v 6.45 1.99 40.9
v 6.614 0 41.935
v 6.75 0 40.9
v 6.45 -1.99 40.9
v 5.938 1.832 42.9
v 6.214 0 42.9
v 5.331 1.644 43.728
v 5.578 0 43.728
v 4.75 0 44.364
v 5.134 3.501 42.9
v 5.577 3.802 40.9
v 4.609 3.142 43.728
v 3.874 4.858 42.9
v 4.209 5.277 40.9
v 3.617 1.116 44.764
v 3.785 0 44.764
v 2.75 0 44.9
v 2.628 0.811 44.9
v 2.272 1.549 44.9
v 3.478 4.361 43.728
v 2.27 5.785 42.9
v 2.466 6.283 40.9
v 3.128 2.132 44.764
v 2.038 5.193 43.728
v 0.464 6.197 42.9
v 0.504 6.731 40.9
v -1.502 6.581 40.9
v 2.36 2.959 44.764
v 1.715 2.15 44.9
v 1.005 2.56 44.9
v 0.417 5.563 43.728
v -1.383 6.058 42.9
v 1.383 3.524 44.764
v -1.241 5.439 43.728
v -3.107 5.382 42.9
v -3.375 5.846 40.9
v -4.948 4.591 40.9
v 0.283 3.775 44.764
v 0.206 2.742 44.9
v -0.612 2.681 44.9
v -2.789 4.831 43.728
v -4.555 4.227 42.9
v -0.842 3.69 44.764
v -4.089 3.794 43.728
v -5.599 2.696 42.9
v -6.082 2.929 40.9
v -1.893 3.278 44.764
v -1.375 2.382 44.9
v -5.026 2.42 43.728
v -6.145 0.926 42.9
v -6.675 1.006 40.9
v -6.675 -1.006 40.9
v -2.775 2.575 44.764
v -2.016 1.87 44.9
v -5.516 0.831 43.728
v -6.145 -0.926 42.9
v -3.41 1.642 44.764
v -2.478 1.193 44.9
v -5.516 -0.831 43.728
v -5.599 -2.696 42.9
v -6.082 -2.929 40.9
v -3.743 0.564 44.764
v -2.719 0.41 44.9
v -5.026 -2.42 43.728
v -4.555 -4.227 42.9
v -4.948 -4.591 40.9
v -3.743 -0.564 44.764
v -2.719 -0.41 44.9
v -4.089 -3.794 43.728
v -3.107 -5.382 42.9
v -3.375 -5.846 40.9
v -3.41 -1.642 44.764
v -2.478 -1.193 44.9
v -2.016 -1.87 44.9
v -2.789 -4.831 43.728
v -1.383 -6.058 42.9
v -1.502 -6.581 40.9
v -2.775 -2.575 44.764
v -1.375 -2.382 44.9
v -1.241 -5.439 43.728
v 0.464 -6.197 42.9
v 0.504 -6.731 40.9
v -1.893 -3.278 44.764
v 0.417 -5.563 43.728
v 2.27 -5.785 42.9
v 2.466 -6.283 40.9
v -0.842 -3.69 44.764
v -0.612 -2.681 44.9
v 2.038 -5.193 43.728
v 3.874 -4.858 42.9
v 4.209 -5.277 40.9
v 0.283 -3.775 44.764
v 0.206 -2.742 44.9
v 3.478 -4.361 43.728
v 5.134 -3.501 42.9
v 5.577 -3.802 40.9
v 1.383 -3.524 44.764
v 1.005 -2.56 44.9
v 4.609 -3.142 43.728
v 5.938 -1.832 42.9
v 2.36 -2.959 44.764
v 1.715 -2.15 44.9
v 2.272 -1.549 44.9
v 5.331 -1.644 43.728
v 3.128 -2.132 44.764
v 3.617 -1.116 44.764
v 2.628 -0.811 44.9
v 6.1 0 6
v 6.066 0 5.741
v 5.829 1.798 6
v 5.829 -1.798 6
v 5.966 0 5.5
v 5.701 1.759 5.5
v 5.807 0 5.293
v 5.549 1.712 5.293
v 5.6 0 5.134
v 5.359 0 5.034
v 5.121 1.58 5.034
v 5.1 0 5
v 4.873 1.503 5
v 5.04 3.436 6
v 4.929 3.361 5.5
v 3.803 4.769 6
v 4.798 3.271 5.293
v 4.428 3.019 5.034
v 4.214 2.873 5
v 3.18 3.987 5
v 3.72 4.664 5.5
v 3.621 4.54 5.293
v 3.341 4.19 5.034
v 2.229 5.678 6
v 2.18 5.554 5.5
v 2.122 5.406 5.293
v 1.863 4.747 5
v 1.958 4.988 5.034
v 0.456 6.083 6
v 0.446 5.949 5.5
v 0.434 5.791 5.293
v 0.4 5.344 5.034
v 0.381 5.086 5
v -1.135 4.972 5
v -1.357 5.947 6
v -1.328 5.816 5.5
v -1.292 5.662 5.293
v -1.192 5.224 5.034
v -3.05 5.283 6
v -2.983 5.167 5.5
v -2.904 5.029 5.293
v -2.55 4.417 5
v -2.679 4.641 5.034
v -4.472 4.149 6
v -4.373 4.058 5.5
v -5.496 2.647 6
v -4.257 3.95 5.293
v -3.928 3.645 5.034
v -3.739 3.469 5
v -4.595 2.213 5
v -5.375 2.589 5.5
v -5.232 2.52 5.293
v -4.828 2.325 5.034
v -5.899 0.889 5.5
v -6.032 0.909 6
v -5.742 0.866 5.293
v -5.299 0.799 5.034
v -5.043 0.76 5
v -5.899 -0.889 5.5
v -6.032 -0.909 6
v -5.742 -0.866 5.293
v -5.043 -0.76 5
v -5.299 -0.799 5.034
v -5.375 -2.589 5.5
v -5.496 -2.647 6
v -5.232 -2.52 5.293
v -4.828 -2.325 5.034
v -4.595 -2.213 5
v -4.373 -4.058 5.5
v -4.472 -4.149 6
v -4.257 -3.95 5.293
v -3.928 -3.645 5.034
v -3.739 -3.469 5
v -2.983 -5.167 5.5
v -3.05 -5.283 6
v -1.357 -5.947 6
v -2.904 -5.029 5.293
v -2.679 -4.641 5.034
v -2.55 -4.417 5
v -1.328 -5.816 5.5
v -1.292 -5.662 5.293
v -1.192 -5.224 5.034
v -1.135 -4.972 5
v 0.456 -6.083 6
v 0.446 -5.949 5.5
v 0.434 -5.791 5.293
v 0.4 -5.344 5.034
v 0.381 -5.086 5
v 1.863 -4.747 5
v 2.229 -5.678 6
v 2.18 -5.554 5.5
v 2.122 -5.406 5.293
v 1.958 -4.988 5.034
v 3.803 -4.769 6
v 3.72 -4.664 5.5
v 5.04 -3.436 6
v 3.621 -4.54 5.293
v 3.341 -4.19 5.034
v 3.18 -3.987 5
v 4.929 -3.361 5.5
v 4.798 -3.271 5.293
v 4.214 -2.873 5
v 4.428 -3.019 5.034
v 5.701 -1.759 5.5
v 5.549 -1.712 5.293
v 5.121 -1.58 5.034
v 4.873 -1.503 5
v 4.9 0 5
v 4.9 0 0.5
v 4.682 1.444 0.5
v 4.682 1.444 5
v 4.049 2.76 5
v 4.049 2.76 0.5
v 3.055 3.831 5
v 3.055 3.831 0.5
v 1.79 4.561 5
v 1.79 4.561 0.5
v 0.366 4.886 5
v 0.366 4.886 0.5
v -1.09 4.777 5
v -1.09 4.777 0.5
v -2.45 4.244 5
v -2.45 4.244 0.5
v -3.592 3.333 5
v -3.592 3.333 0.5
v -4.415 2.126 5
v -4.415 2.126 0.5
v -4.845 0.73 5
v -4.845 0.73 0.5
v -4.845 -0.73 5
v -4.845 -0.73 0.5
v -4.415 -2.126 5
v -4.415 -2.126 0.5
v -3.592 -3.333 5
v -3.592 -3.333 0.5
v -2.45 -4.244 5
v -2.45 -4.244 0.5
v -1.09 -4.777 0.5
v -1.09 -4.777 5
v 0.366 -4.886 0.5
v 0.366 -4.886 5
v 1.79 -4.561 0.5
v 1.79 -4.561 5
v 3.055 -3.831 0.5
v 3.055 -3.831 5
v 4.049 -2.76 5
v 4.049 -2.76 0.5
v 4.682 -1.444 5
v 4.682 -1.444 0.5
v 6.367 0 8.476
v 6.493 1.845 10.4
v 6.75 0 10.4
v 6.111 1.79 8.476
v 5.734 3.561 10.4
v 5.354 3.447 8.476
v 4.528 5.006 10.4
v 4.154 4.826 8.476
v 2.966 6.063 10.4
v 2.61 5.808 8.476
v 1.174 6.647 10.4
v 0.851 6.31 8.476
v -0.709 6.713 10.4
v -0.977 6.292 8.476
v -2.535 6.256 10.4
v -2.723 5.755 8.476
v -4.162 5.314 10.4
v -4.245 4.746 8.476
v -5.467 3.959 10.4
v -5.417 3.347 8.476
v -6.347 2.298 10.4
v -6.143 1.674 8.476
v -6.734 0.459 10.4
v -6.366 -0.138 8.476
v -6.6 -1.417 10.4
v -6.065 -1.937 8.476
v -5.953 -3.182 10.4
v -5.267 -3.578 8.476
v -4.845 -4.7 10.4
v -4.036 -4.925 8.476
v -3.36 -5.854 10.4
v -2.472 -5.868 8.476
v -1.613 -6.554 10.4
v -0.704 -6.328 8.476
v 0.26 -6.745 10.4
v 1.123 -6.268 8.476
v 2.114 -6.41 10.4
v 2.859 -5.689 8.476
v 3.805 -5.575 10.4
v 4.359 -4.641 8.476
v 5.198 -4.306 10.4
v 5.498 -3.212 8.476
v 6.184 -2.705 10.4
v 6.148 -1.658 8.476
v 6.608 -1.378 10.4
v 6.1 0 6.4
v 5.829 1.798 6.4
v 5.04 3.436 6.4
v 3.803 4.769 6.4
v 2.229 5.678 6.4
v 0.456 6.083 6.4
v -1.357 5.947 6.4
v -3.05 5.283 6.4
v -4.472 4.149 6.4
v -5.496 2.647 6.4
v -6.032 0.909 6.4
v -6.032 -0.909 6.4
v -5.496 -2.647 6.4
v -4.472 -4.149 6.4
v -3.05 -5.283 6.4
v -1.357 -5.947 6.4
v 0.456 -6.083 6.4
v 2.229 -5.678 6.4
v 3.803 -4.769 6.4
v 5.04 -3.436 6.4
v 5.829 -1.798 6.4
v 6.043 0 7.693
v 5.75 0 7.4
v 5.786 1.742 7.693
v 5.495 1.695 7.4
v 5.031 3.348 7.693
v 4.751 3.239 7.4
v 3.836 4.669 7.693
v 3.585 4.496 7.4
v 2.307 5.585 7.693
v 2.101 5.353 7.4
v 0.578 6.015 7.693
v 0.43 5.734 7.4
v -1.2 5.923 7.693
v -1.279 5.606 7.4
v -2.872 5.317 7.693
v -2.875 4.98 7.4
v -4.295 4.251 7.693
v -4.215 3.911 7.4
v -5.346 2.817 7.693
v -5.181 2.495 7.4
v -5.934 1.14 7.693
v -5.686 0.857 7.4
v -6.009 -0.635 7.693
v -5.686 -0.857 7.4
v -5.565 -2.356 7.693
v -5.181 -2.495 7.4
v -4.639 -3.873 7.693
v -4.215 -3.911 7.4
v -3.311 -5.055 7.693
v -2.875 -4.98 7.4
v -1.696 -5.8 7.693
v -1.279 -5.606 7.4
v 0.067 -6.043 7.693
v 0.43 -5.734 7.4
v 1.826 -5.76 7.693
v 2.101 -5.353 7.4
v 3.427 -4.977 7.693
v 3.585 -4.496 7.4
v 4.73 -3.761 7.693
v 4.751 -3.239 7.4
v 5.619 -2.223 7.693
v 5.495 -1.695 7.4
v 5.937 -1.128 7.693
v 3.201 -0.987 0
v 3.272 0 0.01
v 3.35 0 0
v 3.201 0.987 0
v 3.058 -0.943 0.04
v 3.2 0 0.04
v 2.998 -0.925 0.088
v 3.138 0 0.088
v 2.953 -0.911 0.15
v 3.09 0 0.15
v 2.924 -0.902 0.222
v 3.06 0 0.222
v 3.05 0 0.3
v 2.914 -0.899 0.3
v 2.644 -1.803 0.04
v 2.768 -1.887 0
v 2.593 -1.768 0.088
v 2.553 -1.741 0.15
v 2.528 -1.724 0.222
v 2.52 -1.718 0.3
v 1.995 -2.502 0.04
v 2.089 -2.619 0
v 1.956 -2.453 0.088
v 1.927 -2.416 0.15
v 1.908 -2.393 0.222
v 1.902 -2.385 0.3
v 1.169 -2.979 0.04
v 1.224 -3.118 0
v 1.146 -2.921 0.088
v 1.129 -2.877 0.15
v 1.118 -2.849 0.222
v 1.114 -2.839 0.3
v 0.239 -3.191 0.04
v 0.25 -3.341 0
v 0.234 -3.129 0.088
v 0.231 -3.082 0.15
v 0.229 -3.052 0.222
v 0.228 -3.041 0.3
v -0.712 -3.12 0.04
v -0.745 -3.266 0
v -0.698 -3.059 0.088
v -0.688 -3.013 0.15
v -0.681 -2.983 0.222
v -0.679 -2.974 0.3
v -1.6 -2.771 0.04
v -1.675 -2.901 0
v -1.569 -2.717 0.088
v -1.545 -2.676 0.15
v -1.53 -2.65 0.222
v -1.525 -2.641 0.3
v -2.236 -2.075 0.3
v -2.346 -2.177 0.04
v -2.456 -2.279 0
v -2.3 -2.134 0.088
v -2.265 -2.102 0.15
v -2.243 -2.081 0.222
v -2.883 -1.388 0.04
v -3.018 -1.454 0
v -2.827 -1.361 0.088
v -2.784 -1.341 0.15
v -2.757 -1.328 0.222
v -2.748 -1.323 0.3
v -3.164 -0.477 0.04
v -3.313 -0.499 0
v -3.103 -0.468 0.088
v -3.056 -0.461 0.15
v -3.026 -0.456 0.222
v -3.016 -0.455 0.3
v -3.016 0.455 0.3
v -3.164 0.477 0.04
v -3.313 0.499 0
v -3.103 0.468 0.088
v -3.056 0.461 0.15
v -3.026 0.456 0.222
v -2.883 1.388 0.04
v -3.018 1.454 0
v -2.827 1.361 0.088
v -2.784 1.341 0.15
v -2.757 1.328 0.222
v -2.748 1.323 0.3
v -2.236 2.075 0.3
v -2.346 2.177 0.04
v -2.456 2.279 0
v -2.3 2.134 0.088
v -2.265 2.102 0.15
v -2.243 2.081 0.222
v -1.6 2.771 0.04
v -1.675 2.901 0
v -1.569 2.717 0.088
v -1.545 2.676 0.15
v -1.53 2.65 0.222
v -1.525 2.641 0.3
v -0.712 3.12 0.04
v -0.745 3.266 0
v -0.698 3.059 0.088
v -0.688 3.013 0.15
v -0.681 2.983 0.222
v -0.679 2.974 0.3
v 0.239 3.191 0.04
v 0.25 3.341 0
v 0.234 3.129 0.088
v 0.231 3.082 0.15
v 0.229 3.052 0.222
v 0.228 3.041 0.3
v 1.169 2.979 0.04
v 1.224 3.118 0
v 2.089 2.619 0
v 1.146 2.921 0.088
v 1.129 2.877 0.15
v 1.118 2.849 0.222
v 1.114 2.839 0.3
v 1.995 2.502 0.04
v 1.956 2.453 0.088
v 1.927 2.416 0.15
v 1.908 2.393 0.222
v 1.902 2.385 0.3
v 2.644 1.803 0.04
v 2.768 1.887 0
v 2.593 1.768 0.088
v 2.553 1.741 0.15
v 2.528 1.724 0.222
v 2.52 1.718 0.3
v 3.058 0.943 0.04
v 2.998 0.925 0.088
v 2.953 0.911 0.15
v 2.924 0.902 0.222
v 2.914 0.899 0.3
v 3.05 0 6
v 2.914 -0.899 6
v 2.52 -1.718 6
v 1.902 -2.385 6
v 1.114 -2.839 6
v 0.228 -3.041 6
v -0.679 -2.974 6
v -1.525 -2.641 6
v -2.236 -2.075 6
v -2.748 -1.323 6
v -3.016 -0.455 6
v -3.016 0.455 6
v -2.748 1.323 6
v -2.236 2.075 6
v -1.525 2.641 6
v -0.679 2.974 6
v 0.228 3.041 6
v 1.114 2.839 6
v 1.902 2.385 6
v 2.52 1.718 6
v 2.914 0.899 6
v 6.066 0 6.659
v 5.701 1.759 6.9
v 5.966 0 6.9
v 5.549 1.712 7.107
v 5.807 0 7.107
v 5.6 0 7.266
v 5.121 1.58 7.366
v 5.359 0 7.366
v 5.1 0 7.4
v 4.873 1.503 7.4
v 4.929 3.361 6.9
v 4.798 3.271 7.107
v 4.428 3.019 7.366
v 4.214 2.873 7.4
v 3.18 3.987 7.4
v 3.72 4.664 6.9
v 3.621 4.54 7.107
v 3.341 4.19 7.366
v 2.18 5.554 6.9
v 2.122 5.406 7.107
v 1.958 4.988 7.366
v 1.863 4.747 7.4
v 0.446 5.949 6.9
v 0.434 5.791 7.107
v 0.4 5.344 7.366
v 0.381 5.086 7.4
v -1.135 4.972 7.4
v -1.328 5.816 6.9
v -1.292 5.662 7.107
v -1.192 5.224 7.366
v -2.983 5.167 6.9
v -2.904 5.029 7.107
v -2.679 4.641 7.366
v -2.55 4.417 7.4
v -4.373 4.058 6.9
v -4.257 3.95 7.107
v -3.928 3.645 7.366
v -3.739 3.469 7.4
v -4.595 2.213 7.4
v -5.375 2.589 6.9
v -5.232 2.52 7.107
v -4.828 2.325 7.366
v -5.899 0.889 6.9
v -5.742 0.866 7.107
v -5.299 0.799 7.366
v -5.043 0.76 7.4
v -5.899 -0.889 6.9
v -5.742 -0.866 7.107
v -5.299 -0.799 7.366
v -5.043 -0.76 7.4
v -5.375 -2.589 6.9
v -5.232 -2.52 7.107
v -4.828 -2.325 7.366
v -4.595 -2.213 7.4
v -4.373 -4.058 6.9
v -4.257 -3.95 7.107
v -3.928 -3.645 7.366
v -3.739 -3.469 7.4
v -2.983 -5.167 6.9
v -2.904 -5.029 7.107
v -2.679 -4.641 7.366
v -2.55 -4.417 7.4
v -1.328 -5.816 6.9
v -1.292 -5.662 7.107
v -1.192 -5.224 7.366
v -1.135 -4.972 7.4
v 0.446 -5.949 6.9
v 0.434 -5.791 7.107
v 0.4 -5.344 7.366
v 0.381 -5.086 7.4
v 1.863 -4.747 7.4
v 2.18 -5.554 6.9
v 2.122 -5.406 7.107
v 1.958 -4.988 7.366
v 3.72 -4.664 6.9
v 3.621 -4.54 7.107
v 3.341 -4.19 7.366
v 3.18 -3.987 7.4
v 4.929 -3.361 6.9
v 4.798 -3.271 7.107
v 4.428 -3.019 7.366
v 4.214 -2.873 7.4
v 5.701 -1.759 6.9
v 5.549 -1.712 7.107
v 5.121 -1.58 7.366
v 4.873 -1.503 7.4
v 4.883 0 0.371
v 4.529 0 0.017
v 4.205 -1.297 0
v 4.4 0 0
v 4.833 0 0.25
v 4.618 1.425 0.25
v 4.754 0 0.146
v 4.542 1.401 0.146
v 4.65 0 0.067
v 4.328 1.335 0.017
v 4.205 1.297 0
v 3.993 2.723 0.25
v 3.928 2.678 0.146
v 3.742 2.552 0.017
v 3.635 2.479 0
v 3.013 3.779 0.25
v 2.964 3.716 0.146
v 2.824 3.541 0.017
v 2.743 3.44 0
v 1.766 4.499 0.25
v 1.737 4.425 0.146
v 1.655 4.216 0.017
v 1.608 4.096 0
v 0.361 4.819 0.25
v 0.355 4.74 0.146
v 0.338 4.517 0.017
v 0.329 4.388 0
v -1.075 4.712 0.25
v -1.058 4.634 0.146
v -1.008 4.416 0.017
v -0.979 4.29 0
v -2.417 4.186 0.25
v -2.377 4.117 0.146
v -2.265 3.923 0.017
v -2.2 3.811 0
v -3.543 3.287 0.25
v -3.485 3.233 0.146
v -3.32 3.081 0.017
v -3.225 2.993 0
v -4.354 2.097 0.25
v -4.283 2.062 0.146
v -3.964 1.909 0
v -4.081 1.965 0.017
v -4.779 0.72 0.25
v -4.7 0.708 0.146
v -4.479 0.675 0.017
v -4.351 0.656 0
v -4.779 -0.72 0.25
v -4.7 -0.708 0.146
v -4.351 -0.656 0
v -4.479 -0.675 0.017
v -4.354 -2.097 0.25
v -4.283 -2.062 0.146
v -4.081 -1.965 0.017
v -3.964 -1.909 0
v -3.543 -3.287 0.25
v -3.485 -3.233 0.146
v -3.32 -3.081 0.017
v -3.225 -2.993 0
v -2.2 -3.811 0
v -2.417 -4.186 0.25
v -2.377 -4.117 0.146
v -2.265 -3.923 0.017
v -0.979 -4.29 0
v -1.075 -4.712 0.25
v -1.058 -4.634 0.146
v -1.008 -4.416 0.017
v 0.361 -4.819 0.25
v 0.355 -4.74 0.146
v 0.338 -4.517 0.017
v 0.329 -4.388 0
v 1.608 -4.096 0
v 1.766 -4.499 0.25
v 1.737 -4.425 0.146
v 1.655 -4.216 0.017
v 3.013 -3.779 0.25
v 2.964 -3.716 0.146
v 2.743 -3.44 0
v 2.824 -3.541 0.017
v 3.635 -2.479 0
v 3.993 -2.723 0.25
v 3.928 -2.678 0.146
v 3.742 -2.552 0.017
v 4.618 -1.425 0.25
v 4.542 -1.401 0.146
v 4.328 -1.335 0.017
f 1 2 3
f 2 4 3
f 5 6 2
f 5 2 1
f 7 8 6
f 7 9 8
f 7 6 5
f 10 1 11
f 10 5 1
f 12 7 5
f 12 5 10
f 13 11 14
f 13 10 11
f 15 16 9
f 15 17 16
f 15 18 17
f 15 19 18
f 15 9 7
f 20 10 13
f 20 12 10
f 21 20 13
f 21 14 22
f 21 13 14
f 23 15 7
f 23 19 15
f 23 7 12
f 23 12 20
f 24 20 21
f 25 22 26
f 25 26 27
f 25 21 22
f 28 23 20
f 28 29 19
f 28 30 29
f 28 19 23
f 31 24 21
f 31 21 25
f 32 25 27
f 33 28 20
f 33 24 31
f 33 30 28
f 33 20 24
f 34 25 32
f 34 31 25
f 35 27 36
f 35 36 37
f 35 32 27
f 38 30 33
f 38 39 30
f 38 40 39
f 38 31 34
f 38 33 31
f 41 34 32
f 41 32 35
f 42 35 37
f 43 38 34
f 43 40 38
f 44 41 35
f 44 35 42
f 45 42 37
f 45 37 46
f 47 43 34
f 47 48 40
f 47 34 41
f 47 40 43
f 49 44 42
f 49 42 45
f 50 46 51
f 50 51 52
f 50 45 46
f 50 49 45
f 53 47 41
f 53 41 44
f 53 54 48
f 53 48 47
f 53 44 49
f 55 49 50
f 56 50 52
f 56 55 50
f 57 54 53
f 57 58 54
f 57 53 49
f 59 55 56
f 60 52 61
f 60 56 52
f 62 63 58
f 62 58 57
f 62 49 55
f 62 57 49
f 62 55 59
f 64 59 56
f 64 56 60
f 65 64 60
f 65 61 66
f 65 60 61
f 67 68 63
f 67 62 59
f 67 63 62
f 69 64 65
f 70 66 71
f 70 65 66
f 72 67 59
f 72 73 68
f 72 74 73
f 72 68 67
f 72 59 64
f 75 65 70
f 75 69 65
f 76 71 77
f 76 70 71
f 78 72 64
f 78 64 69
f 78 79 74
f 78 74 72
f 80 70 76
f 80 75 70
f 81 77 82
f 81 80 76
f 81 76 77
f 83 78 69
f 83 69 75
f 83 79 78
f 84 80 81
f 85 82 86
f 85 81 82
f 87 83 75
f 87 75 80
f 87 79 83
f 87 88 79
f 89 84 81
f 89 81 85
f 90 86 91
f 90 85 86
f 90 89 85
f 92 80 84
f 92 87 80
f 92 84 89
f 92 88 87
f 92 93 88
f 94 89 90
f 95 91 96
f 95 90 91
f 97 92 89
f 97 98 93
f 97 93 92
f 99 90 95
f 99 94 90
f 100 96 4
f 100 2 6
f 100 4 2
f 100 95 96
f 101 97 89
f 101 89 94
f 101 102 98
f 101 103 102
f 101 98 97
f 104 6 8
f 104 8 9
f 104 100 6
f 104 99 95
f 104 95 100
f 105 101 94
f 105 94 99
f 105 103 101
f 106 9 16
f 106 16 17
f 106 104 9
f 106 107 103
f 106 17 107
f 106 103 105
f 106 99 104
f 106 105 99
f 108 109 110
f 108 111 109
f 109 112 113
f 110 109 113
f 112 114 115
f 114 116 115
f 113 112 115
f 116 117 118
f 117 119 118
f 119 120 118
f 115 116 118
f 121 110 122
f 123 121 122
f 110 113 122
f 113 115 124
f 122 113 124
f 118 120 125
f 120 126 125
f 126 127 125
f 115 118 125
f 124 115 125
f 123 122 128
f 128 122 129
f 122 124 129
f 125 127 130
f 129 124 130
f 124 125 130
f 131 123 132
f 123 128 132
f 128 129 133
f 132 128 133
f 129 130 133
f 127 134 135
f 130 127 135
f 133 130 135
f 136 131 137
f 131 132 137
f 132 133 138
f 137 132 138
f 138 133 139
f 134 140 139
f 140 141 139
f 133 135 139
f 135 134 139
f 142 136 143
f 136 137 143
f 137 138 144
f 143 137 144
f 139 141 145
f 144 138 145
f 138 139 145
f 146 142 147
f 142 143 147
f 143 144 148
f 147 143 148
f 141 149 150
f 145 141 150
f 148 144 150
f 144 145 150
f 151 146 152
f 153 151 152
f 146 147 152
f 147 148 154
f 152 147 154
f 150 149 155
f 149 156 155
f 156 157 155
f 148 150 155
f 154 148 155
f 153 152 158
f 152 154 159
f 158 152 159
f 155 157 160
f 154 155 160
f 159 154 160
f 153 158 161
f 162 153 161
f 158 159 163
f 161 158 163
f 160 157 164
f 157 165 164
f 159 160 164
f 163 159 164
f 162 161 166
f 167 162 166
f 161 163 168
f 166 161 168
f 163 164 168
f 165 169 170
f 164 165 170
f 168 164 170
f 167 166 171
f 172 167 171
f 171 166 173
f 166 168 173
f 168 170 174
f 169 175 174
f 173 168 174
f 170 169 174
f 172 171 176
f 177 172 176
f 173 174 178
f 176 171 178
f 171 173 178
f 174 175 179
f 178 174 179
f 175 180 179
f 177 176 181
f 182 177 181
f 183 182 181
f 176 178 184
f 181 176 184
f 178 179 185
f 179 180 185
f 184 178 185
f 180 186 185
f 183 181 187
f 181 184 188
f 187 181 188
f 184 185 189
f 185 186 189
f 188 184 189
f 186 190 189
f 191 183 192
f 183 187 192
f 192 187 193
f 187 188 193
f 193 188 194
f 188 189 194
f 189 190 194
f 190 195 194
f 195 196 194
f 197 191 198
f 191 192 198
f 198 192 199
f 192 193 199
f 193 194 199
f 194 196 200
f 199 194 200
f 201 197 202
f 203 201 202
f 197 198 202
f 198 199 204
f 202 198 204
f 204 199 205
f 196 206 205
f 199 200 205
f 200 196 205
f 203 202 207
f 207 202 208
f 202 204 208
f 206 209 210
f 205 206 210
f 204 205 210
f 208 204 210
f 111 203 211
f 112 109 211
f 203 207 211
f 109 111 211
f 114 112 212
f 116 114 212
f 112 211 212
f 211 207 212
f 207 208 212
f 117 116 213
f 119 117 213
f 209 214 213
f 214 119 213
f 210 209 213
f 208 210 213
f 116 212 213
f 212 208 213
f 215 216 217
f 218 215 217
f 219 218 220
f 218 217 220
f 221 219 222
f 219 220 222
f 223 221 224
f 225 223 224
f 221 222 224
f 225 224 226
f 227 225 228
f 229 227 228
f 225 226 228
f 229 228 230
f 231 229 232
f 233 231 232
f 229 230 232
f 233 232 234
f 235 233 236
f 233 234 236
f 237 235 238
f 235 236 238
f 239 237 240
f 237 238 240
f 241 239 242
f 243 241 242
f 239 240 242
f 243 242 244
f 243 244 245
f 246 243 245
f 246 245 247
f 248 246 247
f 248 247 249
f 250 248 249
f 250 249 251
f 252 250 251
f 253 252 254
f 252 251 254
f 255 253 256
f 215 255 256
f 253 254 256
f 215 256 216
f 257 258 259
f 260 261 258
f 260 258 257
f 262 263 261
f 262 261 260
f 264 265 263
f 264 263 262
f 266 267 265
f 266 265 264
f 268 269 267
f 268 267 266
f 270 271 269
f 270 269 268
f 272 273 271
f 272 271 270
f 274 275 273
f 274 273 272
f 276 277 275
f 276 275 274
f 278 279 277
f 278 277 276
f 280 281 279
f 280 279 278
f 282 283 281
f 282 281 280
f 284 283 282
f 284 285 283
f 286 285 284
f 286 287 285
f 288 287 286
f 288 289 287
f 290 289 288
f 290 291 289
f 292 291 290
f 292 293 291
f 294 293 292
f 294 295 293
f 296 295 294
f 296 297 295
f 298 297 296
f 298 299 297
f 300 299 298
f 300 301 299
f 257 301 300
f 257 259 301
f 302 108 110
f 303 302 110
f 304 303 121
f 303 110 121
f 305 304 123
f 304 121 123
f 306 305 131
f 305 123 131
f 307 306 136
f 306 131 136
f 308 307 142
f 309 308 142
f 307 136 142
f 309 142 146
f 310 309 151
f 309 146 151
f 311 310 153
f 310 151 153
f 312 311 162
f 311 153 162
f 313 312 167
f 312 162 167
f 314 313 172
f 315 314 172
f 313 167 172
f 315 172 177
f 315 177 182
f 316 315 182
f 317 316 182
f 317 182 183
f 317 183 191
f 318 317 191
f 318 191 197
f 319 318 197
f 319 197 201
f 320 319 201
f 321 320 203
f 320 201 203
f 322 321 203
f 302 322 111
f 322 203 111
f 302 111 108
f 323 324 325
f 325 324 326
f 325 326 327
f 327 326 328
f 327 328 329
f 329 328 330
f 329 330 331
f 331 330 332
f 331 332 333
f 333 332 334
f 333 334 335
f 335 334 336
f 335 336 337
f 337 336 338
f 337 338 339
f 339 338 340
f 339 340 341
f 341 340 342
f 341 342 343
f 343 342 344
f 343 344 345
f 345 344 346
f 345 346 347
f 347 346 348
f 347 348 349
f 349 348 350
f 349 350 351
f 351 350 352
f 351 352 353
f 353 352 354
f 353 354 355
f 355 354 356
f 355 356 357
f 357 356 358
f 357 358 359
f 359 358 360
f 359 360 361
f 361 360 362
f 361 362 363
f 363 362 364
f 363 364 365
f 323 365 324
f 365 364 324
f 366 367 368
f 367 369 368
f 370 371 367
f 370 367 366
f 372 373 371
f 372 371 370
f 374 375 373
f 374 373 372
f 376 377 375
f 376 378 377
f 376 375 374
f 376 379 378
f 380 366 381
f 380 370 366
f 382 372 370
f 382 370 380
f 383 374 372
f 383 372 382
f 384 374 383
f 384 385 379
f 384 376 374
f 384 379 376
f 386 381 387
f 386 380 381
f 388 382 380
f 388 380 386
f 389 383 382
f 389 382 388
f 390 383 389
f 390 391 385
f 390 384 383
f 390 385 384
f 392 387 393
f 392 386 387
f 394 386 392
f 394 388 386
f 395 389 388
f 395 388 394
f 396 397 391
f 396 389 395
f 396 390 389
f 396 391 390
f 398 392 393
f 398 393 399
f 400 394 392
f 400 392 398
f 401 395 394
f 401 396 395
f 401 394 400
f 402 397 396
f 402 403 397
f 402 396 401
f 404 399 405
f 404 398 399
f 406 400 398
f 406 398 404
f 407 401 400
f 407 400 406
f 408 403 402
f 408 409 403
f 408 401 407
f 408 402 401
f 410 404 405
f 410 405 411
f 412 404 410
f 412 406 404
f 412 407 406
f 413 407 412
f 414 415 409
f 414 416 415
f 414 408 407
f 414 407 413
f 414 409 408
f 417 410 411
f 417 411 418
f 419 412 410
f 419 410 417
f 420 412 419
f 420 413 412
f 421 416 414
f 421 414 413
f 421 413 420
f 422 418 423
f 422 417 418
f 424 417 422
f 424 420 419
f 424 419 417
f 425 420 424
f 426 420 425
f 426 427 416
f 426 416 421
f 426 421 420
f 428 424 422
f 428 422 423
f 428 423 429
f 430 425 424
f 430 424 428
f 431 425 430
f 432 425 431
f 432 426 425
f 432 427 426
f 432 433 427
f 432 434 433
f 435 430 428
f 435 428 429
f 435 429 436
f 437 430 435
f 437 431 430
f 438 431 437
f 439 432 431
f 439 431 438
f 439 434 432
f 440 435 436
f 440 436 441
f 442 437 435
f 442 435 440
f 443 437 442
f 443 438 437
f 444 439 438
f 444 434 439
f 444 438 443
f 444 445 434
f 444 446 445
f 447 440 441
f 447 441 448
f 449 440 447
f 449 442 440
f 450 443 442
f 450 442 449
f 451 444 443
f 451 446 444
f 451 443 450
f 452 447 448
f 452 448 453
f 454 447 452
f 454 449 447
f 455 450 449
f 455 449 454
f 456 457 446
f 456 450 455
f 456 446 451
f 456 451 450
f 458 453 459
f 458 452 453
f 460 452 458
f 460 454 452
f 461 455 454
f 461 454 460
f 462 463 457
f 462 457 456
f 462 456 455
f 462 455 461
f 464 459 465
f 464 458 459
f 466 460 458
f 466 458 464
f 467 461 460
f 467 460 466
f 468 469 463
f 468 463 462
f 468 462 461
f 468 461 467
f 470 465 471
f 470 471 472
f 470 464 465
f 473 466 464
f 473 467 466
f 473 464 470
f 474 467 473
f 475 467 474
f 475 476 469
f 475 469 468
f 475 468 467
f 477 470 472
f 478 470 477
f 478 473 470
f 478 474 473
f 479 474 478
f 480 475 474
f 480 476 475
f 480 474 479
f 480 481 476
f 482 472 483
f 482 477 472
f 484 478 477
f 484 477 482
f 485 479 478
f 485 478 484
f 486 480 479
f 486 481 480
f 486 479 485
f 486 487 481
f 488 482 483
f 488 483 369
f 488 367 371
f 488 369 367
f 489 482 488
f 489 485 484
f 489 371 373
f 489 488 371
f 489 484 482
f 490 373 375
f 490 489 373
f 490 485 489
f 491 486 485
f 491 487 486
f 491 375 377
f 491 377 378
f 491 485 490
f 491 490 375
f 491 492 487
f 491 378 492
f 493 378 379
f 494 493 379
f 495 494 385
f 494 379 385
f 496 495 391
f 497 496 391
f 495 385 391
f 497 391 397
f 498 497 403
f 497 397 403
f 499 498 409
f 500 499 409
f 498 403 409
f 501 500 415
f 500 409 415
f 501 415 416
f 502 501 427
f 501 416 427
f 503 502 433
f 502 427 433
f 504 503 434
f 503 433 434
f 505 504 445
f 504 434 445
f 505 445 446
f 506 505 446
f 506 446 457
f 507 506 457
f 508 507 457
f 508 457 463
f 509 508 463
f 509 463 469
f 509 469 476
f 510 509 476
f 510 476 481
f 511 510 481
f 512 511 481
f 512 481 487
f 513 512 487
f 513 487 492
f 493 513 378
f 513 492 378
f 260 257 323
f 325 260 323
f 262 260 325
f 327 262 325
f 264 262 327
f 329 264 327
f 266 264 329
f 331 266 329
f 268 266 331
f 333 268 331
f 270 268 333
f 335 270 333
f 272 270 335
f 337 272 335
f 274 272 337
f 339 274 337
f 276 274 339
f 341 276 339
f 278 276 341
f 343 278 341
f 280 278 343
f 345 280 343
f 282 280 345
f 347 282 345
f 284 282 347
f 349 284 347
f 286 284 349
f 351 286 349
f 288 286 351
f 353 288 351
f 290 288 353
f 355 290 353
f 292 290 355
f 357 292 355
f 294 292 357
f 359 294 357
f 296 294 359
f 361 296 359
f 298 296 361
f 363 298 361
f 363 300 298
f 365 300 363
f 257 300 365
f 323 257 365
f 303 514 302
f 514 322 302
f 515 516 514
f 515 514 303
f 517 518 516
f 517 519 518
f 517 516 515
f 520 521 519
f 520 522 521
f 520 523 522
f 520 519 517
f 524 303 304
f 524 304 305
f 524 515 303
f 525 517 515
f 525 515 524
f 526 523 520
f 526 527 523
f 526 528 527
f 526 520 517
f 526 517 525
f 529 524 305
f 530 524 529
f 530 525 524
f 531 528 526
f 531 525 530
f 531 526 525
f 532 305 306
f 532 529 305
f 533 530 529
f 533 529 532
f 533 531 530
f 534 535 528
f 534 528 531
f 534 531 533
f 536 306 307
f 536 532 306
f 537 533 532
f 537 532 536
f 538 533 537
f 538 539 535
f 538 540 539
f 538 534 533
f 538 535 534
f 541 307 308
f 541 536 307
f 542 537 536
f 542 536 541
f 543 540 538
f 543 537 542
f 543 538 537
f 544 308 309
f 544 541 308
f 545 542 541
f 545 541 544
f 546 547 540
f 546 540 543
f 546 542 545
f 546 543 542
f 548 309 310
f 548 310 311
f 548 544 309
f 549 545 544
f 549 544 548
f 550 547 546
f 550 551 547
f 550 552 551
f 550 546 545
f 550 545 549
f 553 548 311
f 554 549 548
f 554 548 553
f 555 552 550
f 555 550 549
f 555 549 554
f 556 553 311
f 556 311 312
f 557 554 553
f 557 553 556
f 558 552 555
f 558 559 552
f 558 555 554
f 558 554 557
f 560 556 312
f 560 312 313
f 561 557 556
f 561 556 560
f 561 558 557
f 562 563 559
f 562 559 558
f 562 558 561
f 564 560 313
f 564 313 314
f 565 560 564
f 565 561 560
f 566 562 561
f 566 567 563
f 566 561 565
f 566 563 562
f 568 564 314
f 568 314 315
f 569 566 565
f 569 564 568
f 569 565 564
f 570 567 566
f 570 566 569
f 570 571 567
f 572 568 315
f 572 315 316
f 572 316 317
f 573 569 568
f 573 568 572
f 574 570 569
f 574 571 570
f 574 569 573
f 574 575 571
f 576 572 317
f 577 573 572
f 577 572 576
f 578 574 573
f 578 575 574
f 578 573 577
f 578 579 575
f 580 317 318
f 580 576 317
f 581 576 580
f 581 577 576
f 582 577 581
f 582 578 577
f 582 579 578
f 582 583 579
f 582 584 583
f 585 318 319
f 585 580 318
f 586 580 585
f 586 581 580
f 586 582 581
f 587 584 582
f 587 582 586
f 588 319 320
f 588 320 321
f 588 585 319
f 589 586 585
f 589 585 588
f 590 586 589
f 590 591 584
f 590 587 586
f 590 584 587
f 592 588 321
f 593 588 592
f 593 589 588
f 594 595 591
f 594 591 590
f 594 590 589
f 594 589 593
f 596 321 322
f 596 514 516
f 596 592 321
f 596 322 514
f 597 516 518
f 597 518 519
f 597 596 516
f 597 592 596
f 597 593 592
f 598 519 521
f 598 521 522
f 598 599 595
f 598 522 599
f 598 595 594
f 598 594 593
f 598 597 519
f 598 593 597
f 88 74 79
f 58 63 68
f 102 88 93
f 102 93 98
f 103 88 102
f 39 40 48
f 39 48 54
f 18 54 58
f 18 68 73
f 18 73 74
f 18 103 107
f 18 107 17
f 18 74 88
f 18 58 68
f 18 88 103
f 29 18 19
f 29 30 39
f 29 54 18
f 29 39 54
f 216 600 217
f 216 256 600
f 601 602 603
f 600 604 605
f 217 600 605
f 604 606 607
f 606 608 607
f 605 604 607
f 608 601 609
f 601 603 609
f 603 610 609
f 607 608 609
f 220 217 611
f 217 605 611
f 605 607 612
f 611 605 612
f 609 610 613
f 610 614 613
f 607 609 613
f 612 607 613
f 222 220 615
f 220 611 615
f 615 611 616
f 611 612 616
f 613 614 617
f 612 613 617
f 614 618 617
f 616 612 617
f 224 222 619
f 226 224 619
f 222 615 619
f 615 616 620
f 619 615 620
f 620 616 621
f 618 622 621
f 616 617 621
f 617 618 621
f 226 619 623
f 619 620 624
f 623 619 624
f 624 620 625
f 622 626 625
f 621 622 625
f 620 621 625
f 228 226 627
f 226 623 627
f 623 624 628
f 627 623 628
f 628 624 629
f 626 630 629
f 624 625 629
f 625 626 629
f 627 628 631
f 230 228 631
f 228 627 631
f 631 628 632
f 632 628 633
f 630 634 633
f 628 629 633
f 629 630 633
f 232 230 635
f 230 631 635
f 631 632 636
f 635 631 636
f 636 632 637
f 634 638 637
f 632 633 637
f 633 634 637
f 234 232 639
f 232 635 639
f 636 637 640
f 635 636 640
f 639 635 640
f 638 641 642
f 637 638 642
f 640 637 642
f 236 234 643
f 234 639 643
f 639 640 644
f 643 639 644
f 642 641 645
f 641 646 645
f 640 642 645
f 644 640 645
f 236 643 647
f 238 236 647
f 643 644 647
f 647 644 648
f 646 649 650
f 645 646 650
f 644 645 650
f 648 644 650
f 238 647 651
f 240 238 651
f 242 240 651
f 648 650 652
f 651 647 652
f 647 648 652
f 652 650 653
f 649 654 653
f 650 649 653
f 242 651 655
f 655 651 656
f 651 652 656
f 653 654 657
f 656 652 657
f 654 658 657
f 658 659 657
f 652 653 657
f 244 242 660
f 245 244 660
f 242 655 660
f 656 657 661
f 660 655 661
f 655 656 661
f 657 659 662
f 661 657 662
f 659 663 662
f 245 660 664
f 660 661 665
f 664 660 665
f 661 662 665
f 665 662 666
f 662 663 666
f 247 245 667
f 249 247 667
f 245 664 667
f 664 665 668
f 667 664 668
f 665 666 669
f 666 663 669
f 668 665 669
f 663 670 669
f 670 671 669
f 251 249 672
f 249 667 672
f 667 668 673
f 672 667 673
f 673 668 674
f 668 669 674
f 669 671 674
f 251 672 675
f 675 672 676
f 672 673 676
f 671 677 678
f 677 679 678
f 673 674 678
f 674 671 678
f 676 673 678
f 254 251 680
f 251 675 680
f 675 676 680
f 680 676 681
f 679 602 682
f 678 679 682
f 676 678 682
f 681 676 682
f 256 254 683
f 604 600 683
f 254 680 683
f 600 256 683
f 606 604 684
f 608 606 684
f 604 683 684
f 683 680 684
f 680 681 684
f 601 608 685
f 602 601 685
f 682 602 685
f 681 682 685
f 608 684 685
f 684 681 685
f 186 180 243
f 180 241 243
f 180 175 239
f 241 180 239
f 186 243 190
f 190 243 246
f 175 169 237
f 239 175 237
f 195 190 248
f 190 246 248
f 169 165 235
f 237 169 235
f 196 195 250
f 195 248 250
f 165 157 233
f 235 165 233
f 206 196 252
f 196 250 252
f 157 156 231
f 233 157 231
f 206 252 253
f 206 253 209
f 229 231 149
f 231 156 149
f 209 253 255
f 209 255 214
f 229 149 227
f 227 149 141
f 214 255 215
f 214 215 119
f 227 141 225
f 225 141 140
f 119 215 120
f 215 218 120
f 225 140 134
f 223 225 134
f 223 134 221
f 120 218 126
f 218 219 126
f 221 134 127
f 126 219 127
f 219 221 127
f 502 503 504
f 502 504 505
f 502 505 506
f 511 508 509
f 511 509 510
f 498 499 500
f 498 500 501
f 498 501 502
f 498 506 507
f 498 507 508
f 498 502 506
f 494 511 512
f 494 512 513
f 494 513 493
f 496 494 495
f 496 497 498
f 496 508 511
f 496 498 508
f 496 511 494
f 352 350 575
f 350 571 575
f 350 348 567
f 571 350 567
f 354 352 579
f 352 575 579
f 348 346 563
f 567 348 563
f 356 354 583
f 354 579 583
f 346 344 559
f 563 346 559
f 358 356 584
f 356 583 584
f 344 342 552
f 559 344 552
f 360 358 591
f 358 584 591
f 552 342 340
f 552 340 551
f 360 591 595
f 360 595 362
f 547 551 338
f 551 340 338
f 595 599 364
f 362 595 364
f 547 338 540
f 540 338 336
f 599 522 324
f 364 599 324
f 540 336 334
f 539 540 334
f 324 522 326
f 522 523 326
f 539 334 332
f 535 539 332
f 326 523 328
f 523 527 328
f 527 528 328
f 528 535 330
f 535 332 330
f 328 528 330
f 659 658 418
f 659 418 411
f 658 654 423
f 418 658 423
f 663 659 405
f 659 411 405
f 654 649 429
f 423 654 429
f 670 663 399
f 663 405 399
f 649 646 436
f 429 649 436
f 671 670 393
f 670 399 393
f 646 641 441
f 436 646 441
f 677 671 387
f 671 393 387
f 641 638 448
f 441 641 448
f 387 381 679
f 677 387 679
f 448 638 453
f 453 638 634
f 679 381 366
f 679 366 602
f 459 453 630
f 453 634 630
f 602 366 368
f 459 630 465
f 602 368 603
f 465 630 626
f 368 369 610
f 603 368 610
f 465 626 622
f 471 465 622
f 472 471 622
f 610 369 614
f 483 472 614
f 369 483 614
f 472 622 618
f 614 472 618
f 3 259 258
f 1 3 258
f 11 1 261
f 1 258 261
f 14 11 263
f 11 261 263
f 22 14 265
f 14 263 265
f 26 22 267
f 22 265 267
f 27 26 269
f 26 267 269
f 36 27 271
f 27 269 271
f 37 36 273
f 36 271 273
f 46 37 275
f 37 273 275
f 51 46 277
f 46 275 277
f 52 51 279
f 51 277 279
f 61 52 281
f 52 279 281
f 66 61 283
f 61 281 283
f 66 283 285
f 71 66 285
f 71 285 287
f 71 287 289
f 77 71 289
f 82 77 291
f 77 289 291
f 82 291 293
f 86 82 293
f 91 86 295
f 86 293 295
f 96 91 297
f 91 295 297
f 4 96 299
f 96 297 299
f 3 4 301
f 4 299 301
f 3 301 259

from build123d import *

# Parameters (mm, degrees)
SKETCH037_R     = 4.9
PAD032_DEPTH    = 5
SKETCH038_R     = 6.1
PAD033_DEPTH    = 2.4
FILLET002_R     = 1
FILLET003_R     = 0.5
SKETCH039_R     = 6.75
PAD034_DEPTH    = 37.5
FILLET004_R     = 4
CHAMFER_SIZE    = 1
CHAMFER001_SIZE = 1
CHAMFER002_SIZE = 1
SKETCH040_R     = 3.05
POCKET008_DEPTH = 6
FILLET005_R     = 0.3


with BuildPart() as part:
    # Sketch037 → Pad032 (new body)
    with BuildSketch(Plane.XY):
        Circle(SKETCH037_R)
    extrude(amount=PAD032_DEPTH)

    # Sketch038 (on Face3 of Pad032) → Pad033 (join)
    with BuildSketch(Plane.XY.offset(5)):
        Circle(SKETCH038_R)
    extrude(amount=PAD033_DEPTH)

    # Fillet002
    fillet002_edges = [part.edges().sort_by_distance(p)[0] for p in [
        (-6.1, 0, 7.4),
        (-6.1, 0, 5),
    ]]
    fillet(fillet002_edges, radius=FILLET002_R)

    # Fillet003
    fillet003_edges = [part.edges().sort_by_distance(p)[0] for p in [
        (-4.9, 0, 0),
    ]]
    fillet(fillet003_edges, radius=FILLET003_R)

    # Sketch039 (on Face8 of Fillet003) → Pad034 (join)
    with BuildSketch(Plane.XY.offset(7.4)):
        Circle(SKETCH039_R)
    extrude(amount=PAD034_DEPTH)

    # Fillet004
    fillet004_edges = [part.edges().sort_by_distance(p)[0] for p in [
        (-6.75, 0, 44.9),
    ]]
    fillet(fillet004_edges, radius=FILLET004_R)

    # Chamfer
    chamfer_edges = [part.edges().sort_by_distance(p)[0] for p in [
        (-6.75, 0, 7.4),
    ]]
    chamfer(chamfer_edges, length=CHAMFER_SIZE)

    # Chamfer001
    chamfer001_edges = [part.edges().sort_by_distance(p)[0] for p in [
        (-6.75, 0, 8.4),
    ]]
    chamfer(chamfer001_edges, length=CHAMFER001_SIZE)

    # Chamfer002
    chamfer002_edges = [part.edges().sort_by_distance(p)[0] for p in [
        (-6.749971, 0, 9.4),
    ]]
    chamfer(chamfer002_edges, length=CHAMFER002_SIZE)

    # Sketch040 (on Face14 of Chamfer002) → Pocket008 (cut)
    with BuildSketch(Plane(origin=(0, 0, 0), x_dir=(1, 0, 0), z_dir=(0, 0, -1))):
        Circle(SKETCH040_R)
    extrude(amount=-POCKET008_DEPTH, mode=Mode.SUBTRACT)

    # Fillet005
    fillet005_edges = [part.edges().sort_by_distance(p)[0] for p in [
        (-3.05, 0, 0),
    ]]
    fillet(fillet005_edges, radius=FILLET005_R)


solid = part.part
